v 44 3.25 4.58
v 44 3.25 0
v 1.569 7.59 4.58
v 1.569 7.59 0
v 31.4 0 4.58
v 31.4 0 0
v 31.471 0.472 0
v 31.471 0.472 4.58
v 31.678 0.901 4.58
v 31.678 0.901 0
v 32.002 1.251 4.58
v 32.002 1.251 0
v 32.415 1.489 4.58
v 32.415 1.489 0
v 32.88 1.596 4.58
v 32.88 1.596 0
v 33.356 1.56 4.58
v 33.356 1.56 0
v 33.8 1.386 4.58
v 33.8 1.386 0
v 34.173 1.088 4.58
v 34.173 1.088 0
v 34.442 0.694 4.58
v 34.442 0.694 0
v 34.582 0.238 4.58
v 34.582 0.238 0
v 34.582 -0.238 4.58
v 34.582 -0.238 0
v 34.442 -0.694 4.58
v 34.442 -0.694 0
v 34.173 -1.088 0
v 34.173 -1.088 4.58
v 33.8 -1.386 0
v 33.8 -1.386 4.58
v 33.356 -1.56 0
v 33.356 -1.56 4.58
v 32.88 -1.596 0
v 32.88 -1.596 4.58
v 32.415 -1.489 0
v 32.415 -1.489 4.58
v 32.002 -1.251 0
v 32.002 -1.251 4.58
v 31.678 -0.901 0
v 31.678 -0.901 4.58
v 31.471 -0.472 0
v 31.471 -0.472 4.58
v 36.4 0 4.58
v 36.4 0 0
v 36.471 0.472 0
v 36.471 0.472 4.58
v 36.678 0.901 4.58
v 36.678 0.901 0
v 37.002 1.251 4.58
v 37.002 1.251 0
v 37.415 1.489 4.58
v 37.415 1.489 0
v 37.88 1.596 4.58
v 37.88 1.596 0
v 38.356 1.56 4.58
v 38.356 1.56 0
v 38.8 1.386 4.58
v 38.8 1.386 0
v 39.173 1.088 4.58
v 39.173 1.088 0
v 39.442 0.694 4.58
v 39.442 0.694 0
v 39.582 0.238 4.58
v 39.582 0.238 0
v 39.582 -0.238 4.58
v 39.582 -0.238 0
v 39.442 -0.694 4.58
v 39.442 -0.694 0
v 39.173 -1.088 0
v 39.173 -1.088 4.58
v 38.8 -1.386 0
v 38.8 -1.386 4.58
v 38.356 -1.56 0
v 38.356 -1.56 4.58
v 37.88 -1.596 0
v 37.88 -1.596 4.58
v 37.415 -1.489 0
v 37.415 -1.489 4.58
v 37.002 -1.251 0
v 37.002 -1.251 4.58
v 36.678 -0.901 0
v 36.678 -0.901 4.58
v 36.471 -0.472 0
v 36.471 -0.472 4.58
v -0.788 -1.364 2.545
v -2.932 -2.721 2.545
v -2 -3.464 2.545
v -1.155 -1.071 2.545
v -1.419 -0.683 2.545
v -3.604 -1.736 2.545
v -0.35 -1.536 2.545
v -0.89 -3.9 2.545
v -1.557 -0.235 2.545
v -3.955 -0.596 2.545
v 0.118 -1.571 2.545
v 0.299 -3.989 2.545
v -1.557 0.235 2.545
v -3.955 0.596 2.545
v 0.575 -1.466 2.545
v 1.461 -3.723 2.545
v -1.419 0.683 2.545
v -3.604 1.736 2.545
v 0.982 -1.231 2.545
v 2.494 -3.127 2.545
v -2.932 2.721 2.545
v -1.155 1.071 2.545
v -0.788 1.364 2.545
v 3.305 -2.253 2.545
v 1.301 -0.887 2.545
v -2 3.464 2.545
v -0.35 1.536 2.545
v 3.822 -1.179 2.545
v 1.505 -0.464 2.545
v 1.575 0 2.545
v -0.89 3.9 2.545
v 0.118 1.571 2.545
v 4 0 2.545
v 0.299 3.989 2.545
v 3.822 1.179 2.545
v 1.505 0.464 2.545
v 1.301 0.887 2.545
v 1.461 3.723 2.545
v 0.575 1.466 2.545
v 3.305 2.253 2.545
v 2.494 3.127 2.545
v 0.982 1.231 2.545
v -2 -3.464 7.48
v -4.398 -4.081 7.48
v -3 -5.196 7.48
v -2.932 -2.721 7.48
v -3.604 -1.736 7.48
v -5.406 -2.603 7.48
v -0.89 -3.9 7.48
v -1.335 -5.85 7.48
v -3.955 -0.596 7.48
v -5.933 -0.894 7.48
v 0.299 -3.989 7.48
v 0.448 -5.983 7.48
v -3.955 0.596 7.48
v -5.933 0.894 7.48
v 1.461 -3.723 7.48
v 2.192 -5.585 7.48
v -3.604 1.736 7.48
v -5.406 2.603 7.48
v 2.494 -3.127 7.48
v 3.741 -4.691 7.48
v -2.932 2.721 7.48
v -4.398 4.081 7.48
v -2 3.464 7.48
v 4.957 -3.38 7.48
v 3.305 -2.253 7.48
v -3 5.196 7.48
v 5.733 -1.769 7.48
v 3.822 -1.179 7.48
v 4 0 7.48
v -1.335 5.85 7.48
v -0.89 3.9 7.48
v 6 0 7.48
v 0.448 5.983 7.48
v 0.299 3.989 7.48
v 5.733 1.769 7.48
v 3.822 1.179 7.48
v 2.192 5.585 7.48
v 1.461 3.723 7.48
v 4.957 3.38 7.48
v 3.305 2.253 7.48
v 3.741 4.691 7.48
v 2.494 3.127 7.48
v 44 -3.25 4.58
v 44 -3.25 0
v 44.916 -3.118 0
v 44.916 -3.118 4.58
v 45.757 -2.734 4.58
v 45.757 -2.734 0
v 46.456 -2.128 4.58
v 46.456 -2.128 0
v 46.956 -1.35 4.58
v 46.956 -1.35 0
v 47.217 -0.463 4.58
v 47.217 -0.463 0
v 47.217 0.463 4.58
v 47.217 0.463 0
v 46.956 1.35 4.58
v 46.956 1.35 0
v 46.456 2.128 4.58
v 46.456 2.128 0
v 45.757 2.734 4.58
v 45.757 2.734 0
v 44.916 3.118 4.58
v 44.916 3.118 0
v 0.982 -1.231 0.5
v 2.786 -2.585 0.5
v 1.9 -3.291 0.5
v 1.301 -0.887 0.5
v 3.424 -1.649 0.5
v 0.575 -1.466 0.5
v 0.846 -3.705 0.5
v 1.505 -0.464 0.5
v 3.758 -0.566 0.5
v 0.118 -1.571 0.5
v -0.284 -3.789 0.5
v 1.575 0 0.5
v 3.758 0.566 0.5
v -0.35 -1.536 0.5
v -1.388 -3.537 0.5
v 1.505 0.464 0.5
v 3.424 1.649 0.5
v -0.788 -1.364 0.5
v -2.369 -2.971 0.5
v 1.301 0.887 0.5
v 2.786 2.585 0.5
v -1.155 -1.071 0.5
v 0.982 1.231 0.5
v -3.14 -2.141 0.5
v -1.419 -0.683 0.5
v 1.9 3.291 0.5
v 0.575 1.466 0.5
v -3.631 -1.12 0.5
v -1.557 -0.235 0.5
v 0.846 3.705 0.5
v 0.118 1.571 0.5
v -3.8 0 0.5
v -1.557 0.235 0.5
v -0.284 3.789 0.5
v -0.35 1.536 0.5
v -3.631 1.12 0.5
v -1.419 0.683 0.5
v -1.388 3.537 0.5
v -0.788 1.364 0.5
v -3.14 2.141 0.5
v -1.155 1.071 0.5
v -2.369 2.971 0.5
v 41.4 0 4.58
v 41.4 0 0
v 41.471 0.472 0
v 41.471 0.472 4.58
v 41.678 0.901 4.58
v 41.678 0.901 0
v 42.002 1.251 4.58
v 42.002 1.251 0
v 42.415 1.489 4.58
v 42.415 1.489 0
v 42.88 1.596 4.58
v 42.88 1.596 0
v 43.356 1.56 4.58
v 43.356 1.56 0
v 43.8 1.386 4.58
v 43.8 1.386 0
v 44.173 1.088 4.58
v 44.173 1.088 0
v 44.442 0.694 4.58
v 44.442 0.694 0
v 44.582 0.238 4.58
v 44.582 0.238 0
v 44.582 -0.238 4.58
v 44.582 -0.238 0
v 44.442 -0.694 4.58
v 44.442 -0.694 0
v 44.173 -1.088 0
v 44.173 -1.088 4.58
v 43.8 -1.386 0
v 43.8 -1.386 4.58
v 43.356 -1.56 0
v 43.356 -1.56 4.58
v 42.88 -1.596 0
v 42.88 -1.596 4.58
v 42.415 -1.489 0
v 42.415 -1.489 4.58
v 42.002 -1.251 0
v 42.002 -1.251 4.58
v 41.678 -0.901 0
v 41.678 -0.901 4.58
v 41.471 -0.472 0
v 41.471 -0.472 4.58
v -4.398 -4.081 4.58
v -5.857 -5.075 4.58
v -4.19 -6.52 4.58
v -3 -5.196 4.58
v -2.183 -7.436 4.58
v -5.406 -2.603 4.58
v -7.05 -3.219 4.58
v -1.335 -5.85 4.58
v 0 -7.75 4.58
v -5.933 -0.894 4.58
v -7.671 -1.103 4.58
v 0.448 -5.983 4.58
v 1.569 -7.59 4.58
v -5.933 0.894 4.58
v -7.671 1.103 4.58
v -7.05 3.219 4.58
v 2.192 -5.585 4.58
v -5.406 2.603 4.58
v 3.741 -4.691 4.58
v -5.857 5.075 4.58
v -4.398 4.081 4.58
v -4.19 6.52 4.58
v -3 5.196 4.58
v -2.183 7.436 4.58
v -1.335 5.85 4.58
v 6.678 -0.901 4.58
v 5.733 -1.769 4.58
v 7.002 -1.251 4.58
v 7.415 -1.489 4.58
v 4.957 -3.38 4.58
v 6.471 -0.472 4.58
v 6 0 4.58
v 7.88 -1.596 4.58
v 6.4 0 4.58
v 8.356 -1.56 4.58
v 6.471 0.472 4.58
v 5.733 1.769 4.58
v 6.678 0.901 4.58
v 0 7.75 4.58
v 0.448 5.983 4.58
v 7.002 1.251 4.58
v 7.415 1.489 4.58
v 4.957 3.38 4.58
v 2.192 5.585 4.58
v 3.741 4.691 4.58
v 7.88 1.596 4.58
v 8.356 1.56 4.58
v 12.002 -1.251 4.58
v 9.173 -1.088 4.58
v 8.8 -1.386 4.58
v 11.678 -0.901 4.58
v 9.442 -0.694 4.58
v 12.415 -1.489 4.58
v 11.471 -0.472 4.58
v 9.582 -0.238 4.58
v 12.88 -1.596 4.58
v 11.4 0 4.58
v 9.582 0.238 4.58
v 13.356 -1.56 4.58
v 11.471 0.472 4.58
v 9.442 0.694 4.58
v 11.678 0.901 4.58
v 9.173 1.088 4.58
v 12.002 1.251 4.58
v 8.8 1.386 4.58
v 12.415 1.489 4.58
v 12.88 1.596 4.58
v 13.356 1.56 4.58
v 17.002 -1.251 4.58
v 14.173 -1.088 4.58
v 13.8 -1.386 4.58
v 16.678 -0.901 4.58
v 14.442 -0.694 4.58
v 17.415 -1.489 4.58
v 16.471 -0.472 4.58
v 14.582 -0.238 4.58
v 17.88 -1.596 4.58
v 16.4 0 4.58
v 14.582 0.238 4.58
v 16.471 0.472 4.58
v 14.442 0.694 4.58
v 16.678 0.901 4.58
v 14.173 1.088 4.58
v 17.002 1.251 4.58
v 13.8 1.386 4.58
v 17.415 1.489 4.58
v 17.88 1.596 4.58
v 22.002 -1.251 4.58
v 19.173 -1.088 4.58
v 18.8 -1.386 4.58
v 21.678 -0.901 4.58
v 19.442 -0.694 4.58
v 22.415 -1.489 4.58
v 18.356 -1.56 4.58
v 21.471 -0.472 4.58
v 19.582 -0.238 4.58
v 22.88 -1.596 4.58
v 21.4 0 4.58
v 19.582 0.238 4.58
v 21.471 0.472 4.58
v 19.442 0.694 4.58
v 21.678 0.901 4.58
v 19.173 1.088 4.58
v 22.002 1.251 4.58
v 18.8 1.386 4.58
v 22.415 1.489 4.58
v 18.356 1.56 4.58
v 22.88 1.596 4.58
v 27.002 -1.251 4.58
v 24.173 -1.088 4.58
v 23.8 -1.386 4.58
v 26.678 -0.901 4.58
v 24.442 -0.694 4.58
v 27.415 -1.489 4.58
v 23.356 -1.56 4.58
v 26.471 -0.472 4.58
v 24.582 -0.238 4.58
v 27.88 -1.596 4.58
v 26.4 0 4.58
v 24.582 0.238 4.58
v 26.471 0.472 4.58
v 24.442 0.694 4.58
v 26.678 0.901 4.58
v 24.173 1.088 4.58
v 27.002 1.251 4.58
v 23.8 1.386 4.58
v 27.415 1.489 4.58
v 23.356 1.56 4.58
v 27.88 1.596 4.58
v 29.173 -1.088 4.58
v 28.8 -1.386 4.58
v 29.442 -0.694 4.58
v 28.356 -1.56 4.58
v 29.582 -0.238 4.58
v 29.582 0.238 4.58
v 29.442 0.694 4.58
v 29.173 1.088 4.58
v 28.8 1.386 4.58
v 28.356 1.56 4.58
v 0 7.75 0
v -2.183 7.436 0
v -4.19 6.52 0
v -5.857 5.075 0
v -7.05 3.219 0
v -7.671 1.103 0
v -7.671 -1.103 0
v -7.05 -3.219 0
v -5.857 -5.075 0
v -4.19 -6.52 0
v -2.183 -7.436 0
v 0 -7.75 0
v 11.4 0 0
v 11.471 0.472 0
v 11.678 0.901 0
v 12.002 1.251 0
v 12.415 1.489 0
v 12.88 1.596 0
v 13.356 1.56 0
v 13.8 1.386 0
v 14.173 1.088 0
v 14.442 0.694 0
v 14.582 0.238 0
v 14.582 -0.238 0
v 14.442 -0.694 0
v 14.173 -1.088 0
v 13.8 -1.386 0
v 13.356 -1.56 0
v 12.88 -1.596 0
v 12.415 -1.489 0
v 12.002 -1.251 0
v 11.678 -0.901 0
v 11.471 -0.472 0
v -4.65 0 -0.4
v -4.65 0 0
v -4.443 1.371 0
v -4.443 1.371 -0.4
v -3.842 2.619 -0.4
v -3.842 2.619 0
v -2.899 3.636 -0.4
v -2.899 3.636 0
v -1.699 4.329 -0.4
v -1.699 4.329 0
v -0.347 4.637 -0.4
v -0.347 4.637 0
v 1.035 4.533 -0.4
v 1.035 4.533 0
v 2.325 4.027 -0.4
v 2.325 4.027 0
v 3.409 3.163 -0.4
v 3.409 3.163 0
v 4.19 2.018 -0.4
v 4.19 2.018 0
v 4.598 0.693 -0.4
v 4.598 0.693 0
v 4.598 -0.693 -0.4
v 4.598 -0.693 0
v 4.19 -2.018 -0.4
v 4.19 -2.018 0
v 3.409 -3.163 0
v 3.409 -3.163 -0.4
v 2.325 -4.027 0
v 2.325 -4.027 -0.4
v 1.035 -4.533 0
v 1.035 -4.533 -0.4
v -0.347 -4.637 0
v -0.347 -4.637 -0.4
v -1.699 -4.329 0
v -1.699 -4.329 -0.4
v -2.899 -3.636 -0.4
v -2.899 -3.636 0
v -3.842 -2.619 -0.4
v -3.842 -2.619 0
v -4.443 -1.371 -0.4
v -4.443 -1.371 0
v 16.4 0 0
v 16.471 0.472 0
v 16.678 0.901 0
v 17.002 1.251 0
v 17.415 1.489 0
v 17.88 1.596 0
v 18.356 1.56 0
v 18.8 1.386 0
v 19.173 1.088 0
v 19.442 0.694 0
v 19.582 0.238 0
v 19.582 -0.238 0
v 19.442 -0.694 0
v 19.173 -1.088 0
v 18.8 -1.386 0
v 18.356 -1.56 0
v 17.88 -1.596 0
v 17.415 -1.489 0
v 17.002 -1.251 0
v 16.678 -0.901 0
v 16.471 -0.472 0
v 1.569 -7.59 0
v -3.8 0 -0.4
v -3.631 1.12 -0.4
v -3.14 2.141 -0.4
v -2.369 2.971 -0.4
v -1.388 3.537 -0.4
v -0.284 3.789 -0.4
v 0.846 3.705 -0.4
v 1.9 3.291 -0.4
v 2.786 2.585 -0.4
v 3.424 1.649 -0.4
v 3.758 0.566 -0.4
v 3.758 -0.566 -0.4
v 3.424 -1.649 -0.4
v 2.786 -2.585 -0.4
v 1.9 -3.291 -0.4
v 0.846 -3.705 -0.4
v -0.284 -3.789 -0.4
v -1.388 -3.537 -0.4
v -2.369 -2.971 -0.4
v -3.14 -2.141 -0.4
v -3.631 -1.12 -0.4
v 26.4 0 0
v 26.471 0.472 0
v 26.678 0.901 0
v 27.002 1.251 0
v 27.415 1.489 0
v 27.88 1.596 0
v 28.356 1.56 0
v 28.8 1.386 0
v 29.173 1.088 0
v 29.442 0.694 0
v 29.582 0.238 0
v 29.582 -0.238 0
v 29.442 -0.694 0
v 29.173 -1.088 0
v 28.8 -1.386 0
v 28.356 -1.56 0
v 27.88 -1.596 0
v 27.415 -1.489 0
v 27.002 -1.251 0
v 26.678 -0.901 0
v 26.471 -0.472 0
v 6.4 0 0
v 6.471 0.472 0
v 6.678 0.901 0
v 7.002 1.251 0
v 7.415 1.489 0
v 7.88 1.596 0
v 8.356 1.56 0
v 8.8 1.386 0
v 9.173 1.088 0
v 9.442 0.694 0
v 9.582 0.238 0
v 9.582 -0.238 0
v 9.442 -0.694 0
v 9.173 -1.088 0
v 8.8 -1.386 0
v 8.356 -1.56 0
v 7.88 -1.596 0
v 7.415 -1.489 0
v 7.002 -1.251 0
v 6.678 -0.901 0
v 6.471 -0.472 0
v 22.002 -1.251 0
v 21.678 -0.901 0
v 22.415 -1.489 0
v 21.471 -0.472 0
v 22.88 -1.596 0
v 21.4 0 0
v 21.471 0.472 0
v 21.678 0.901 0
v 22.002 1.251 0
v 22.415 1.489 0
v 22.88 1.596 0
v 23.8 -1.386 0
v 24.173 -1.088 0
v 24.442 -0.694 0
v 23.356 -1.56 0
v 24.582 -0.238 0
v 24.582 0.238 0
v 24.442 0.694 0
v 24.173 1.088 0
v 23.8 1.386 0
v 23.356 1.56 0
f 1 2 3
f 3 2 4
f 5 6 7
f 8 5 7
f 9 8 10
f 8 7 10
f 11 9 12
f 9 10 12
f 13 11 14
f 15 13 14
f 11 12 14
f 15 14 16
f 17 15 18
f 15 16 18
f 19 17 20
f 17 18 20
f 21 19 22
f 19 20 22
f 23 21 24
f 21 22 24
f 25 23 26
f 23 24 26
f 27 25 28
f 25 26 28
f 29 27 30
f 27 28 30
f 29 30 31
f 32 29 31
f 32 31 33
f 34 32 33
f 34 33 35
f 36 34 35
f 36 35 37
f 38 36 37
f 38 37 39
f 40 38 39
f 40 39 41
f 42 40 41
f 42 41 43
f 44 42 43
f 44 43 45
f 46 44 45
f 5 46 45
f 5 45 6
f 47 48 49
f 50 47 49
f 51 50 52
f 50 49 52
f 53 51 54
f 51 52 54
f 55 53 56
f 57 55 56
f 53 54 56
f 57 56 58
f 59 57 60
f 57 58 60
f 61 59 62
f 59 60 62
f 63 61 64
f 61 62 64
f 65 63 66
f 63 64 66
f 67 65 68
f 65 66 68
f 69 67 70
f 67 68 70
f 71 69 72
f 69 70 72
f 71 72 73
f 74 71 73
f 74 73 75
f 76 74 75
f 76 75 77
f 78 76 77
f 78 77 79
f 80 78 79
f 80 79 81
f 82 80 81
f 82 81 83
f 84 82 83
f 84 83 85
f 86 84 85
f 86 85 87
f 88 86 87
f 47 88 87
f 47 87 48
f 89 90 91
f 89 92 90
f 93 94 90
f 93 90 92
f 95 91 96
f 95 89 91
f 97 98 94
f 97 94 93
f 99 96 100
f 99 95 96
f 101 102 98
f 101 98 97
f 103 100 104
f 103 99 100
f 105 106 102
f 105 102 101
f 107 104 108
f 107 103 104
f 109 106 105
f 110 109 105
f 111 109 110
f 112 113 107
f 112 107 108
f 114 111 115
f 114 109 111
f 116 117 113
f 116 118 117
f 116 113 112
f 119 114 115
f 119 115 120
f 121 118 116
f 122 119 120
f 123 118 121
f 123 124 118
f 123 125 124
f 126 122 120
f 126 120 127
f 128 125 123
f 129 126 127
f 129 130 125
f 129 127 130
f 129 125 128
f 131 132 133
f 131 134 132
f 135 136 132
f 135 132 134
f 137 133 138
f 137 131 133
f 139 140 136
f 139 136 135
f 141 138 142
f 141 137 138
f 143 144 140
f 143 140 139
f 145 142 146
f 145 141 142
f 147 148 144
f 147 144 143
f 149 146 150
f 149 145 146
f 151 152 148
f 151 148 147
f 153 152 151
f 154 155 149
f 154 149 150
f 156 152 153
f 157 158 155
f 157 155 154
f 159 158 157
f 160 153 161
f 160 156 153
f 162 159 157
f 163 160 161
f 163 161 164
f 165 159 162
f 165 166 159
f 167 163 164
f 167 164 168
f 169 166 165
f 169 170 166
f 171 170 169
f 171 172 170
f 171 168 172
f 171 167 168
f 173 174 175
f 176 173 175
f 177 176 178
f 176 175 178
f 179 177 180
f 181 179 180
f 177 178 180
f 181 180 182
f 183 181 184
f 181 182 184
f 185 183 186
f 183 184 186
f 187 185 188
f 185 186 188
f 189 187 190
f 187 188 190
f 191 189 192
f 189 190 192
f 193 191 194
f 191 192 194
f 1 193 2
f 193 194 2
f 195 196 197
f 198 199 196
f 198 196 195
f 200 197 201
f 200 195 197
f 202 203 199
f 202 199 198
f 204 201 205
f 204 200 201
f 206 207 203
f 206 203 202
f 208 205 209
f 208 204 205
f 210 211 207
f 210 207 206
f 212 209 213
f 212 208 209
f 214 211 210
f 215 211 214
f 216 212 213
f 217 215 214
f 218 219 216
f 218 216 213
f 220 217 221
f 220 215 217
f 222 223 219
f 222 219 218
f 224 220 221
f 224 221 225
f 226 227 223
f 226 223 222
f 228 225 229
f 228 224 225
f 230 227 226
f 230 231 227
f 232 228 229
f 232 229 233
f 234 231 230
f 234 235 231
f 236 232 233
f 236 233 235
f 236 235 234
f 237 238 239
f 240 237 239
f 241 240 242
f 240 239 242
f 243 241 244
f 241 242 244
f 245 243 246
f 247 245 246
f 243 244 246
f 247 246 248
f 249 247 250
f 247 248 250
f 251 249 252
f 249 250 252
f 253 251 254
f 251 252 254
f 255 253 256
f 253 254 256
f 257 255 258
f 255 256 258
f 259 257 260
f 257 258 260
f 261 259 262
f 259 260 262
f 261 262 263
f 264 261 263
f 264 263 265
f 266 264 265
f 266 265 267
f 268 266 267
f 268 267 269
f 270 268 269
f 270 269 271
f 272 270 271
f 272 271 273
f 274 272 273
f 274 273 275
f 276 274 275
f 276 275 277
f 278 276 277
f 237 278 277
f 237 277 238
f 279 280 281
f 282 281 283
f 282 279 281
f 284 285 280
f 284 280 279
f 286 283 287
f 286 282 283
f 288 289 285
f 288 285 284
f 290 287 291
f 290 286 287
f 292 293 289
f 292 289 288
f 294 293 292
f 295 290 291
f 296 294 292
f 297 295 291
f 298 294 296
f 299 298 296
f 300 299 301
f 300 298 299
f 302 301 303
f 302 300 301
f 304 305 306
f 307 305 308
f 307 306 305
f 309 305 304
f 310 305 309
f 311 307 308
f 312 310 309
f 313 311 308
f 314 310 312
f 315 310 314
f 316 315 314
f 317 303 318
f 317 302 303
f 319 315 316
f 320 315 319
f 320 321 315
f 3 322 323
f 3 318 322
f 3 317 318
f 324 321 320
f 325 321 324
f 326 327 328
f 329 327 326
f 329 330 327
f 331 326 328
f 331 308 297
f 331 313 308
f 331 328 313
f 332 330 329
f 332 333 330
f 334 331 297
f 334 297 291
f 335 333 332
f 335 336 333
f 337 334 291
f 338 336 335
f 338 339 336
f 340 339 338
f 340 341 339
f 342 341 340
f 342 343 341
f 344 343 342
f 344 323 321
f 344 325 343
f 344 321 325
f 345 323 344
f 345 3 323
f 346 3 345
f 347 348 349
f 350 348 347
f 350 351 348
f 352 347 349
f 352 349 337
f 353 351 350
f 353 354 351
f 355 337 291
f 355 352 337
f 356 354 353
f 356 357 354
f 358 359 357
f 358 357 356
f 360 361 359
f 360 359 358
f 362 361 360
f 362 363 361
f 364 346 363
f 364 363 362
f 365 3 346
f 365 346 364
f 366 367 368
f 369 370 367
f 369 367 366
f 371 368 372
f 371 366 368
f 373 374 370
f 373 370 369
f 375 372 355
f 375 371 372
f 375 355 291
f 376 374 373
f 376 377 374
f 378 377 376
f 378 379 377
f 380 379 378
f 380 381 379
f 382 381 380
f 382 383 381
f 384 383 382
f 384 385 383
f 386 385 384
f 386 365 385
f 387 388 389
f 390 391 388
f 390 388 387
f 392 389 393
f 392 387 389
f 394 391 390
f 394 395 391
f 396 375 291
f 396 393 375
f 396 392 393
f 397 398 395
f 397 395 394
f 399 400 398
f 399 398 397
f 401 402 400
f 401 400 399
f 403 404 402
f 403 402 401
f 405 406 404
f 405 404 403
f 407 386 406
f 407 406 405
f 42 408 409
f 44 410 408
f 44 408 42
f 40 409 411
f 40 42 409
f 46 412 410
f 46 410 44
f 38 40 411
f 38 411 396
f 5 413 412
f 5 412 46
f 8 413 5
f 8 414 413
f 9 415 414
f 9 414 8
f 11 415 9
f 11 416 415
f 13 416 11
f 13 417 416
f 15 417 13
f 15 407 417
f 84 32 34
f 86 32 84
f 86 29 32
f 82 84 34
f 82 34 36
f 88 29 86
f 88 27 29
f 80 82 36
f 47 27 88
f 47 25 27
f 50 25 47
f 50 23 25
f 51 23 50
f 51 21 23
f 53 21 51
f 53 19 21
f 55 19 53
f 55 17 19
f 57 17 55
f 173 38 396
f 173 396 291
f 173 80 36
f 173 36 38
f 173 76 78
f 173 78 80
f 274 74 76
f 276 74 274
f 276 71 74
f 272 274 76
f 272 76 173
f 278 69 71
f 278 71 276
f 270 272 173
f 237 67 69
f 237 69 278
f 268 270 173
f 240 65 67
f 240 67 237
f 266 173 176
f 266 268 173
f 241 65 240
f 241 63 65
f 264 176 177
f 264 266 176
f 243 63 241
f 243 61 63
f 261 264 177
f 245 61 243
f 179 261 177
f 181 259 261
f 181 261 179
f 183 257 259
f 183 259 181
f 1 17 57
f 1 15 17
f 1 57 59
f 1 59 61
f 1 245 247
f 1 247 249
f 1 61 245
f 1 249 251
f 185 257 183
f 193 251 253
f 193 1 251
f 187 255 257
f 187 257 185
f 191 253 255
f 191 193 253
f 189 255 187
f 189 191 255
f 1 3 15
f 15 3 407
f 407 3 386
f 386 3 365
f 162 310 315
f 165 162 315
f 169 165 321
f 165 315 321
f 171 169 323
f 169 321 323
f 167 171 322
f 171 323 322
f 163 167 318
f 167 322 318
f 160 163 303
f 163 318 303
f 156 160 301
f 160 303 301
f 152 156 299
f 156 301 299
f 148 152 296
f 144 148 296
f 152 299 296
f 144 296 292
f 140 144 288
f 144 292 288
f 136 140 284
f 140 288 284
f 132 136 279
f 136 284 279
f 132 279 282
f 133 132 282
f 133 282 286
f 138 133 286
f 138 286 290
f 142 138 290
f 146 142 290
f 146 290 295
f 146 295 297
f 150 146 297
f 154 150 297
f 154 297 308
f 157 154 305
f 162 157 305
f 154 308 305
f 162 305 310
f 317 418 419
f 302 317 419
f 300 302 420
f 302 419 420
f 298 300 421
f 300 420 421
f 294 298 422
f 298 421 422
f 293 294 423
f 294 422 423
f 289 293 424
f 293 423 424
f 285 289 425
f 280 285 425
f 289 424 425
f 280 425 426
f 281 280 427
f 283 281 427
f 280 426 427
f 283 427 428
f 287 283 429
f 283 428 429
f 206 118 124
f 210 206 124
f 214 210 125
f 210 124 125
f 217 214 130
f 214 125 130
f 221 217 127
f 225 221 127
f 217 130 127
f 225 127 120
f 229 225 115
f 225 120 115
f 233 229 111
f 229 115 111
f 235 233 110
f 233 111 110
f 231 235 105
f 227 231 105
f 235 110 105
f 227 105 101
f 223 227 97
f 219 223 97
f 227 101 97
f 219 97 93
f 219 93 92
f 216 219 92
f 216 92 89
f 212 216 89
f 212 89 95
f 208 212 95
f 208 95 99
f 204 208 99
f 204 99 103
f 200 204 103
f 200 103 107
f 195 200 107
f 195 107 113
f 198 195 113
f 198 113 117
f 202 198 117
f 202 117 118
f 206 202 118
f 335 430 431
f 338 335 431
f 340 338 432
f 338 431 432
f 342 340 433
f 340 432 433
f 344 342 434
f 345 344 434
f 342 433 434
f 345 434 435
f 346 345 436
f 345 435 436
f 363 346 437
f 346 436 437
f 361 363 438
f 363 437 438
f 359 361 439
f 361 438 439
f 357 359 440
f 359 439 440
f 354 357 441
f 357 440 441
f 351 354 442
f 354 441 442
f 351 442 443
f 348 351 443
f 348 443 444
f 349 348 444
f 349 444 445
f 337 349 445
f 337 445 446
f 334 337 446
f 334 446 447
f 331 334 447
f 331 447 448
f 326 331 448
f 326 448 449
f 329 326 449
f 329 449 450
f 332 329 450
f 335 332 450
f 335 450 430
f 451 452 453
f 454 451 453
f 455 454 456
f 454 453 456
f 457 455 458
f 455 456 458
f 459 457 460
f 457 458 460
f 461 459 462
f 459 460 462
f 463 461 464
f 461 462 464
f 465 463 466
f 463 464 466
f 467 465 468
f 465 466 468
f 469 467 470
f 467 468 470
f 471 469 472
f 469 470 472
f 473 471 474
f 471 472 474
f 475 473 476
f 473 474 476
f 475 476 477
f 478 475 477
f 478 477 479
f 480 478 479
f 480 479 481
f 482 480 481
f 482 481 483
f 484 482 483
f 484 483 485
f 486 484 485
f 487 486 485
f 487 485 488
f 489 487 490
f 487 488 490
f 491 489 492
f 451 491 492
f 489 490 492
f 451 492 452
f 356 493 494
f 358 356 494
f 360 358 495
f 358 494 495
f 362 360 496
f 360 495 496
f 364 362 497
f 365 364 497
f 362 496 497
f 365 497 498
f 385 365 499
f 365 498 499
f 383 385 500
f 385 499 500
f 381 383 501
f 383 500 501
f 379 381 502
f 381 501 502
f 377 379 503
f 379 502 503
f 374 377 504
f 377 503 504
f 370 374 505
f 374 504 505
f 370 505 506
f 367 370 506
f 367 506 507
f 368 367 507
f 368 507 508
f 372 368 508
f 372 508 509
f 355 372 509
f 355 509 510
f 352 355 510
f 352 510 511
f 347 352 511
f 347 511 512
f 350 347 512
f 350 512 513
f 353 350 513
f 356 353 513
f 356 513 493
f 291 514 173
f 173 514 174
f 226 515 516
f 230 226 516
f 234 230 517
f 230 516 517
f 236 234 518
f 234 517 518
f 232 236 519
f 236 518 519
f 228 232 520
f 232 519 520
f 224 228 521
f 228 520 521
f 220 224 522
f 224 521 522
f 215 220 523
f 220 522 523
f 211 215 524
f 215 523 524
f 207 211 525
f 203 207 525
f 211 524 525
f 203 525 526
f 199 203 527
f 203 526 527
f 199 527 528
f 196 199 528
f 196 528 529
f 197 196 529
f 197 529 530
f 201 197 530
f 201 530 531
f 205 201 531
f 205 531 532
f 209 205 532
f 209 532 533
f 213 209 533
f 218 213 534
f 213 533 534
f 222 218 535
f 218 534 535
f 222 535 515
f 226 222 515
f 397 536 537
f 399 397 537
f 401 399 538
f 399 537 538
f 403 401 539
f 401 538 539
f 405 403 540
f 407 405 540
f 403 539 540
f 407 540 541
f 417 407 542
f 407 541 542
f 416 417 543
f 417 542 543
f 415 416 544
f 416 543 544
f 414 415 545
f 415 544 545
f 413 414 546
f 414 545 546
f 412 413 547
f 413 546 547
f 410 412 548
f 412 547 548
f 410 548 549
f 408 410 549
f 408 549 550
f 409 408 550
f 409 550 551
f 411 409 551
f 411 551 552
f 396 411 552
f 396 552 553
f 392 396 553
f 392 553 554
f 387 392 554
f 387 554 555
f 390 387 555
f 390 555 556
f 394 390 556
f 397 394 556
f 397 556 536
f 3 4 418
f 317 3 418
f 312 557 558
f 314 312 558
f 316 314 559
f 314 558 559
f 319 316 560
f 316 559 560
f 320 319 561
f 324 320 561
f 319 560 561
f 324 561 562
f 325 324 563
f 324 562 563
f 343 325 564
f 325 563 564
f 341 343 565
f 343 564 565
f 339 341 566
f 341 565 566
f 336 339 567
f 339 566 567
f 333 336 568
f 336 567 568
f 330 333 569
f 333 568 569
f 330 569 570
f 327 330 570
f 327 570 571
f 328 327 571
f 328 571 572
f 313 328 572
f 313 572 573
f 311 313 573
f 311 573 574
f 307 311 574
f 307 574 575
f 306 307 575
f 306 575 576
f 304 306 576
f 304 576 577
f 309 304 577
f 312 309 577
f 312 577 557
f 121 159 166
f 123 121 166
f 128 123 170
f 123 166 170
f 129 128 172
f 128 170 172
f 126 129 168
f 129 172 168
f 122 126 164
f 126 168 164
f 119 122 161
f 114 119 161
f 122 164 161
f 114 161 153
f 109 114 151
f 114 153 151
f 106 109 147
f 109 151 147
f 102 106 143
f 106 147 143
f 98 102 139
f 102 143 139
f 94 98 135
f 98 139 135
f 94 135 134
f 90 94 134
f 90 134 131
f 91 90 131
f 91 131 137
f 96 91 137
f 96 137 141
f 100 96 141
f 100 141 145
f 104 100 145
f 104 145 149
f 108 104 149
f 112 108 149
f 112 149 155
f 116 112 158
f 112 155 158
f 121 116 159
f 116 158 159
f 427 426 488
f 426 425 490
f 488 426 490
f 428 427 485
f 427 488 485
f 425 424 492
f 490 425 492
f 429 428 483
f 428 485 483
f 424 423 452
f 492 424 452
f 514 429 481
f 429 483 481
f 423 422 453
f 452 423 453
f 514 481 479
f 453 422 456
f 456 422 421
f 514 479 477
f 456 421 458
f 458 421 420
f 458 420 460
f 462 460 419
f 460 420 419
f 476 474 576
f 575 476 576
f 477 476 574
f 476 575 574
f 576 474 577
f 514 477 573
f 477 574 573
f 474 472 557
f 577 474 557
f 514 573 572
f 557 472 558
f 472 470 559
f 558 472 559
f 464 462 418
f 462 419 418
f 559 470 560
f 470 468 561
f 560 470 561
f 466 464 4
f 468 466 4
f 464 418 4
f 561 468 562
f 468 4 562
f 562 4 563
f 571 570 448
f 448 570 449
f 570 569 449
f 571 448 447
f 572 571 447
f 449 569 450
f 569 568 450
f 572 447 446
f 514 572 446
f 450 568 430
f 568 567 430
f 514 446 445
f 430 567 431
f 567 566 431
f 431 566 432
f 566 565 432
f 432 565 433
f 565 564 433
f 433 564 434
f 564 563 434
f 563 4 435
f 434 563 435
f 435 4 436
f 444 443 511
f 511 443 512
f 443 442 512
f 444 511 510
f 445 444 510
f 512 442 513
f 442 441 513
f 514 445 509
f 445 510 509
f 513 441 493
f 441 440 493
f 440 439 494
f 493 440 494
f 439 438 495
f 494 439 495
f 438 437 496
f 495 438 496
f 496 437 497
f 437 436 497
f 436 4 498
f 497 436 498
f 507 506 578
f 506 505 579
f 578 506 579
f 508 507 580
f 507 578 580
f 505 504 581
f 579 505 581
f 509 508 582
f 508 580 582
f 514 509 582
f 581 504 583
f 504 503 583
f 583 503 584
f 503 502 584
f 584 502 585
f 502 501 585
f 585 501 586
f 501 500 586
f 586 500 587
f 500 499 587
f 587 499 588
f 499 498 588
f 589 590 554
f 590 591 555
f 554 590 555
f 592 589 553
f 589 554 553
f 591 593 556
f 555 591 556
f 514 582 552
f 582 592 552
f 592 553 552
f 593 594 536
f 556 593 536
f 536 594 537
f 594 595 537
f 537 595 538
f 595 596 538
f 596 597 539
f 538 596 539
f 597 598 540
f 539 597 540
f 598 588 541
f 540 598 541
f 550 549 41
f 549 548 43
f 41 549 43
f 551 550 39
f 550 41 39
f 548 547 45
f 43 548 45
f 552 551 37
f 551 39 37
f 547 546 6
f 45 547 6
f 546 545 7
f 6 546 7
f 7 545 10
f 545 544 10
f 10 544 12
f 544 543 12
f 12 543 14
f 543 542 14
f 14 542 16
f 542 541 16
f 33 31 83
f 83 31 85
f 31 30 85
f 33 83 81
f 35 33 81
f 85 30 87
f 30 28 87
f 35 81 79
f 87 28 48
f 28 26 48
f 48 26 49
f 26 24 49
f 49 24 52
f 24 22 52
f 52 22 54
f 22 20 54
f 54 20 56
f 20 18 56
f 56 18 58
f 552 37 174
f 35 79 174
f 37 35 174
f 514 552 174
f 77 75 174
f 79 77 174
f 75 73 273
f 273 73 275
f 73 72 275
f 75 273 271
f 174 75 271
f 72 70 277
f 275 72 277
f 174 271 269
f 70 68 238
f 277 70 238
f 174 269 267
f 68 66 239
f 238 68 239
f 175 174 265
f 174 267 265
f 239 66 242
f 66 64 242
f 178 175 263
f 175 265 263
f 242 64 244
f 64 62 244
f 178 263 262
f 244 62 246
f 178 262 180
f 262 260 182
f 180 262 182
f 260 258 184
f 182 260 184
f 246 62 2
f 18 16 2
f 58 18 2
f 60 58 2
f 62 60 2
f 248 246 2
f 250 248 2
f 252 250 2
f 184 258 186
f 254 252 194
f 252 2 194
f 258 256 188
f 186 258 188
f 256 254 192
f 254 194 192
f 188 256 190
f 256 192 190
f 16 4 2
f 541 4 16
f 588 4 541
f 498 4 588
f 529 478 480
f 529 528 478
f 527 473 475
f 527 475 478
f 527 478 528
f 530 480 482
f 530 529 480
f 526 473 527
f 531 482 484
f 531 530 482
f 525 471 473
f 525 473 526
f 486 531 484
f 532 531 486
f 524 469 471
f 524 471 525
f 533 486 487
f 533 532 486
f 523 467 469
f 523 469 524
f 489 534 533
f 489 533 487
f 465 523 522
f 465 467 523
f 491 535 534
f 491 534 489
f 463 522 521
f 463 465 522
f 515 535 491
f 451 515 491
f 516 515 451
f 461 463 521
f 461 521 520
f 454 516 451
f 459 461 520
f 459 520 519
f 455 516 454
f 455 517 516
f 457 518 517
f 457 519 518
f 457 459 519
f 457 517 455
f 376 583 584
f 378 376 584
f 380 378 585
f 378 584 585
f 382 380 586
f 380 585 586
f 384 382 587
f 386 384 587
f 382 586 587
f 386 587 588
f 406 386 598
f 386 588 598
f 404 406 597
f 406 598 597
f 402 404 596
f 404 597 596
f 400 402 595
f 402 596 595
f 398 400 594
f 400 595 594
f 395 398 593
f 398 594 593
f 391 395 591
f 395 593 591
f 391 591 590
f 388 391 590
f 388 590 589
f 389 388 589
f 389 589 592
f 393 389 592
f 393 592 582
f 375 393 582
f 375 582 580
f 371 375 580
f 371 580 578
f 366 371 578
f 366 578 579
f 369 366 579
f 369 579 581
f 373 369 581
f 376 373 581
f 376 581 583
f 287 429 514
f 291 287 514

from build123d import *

# Parameters (mm, degrees)
EXTRUDE_1_DEPTH        = 4.58
SKETCH_2_R             = 6
EXTRUDE_2_DEPTH        = 2.9
SKETCH_3_R             = 4
CUT_EXTRUDE_1_DEPTH    = 4.935
SKETCH_6_R             = 4.65
EXTRUDE_3_DEPTH        = 0.4
SKETCH_7_R             = 3.8
CUT_EXTRUDE_4_DEPTH    = 0.9
SKETCH_4_R             = 1.575
CUT_EXTRUDE_2_DEPTH    = 3.945
SKETCH_5_R             = 1.6
CUT_EXTRUDE_3_DEPTH    = 8.48
PATTERN_LINEAR_1_COUNT = 8
PATTERN_LINEAR_1_PITCH = 5


with BuildPart() as part:
    # 草圖1 → 填料-伸長1 (new body)
    with BuildSketch(Plane.XY):
        with BuildLine():
            Line((1.568817891, 7.589552716), (0, 7.75))
            ThreePointArc((0, 7.75), (-7.75, 0), (0, -7.75))
            Line((0, -7.75), (1.568817891, -7.589552716))
            Line((1.568817891, -7.589552716), (44, -3.25))
            ThreePointArc((44, -3.25), (47.25, 0), (44, 3.25))
            Line((44, 3.25), (1.568817891, 7.589552716))
        make_face()
    extrude(amount=EXTRUDE_1_DEPTH)

    # 草圖2 → 填料-伸長2 (add)
    with BuildSketch(Plane.XY.offset(4.58)):
        Circle(SKETCH_2_R)
    extrude(amount=EXTRUDE_2_DEPTH)

    # 草圖3 → 除料-伸長1 (cut)
    with BuildSketch(Plane.XY.offset(7.48)):
        Circle(SKETCH_3_R)
    extrude(amount=-CUT_EXTRUDE_1_DEPTH, mode=Mode.SUBTRACT)

    # 草圖6 → 填料-伸長3 (add)
    with BuildSketch(Plane(origin=(0, 0, 0), x_dir=(-1, 0, 0), z_dir=(0, 0, -1))):
        Circle(SKETCH_6_R)
    extrude(amount=EXTRUDE_3_DEPTH)

    # 草圖7 → 除料-伸長4 (cut)
    with BuildSketch(Plane(origin=(0, 0, -0.4), x_dir=(-1, 0, 0), z_dir=(0, 0, -1))):
        Circle(SKETCH_7_R)
    extrude(amount=-CUT_EXTRUDE_4_DEPTH, mode=Mode.SUBTRACT)

    # 草圖4 → 除料-伸長2 (cut, through all)
    with BuildSketch(Plane.XY.offset(2.545)):
        Circle(SKETCH_4_R)
    extrude(amount=-CUT_EXTRUDE_2_DEPTH, mode=Mode.SUBTRACT)

    # 草圖5 → 除料-伸長3 (cut, through all)
    with BuildSketch(Plane(origin=(0, 0, 0), x_dir=(-1, 0, 0), z_dir=(0, 0, -1))):
        with Locations((-8, 0)):
            Circle(SKETCH_5_R)
    cut_extrude_3 = extrude(amount=-CUT_EXTRUDE_3_DEPTH, mode=Mode.SUBTRACT)

    # 直線複製排列1: 除料-伸長3 ×8
    with Locations(*[(i * PATTERN_LINEAR_1_PITCH, 0, 0) for i in range(1, PATTERN_LINEAR_1_COUNT)]):
        add(cut_extrude_3, mode=Mode.SUBTRACT)


solid = part.part
